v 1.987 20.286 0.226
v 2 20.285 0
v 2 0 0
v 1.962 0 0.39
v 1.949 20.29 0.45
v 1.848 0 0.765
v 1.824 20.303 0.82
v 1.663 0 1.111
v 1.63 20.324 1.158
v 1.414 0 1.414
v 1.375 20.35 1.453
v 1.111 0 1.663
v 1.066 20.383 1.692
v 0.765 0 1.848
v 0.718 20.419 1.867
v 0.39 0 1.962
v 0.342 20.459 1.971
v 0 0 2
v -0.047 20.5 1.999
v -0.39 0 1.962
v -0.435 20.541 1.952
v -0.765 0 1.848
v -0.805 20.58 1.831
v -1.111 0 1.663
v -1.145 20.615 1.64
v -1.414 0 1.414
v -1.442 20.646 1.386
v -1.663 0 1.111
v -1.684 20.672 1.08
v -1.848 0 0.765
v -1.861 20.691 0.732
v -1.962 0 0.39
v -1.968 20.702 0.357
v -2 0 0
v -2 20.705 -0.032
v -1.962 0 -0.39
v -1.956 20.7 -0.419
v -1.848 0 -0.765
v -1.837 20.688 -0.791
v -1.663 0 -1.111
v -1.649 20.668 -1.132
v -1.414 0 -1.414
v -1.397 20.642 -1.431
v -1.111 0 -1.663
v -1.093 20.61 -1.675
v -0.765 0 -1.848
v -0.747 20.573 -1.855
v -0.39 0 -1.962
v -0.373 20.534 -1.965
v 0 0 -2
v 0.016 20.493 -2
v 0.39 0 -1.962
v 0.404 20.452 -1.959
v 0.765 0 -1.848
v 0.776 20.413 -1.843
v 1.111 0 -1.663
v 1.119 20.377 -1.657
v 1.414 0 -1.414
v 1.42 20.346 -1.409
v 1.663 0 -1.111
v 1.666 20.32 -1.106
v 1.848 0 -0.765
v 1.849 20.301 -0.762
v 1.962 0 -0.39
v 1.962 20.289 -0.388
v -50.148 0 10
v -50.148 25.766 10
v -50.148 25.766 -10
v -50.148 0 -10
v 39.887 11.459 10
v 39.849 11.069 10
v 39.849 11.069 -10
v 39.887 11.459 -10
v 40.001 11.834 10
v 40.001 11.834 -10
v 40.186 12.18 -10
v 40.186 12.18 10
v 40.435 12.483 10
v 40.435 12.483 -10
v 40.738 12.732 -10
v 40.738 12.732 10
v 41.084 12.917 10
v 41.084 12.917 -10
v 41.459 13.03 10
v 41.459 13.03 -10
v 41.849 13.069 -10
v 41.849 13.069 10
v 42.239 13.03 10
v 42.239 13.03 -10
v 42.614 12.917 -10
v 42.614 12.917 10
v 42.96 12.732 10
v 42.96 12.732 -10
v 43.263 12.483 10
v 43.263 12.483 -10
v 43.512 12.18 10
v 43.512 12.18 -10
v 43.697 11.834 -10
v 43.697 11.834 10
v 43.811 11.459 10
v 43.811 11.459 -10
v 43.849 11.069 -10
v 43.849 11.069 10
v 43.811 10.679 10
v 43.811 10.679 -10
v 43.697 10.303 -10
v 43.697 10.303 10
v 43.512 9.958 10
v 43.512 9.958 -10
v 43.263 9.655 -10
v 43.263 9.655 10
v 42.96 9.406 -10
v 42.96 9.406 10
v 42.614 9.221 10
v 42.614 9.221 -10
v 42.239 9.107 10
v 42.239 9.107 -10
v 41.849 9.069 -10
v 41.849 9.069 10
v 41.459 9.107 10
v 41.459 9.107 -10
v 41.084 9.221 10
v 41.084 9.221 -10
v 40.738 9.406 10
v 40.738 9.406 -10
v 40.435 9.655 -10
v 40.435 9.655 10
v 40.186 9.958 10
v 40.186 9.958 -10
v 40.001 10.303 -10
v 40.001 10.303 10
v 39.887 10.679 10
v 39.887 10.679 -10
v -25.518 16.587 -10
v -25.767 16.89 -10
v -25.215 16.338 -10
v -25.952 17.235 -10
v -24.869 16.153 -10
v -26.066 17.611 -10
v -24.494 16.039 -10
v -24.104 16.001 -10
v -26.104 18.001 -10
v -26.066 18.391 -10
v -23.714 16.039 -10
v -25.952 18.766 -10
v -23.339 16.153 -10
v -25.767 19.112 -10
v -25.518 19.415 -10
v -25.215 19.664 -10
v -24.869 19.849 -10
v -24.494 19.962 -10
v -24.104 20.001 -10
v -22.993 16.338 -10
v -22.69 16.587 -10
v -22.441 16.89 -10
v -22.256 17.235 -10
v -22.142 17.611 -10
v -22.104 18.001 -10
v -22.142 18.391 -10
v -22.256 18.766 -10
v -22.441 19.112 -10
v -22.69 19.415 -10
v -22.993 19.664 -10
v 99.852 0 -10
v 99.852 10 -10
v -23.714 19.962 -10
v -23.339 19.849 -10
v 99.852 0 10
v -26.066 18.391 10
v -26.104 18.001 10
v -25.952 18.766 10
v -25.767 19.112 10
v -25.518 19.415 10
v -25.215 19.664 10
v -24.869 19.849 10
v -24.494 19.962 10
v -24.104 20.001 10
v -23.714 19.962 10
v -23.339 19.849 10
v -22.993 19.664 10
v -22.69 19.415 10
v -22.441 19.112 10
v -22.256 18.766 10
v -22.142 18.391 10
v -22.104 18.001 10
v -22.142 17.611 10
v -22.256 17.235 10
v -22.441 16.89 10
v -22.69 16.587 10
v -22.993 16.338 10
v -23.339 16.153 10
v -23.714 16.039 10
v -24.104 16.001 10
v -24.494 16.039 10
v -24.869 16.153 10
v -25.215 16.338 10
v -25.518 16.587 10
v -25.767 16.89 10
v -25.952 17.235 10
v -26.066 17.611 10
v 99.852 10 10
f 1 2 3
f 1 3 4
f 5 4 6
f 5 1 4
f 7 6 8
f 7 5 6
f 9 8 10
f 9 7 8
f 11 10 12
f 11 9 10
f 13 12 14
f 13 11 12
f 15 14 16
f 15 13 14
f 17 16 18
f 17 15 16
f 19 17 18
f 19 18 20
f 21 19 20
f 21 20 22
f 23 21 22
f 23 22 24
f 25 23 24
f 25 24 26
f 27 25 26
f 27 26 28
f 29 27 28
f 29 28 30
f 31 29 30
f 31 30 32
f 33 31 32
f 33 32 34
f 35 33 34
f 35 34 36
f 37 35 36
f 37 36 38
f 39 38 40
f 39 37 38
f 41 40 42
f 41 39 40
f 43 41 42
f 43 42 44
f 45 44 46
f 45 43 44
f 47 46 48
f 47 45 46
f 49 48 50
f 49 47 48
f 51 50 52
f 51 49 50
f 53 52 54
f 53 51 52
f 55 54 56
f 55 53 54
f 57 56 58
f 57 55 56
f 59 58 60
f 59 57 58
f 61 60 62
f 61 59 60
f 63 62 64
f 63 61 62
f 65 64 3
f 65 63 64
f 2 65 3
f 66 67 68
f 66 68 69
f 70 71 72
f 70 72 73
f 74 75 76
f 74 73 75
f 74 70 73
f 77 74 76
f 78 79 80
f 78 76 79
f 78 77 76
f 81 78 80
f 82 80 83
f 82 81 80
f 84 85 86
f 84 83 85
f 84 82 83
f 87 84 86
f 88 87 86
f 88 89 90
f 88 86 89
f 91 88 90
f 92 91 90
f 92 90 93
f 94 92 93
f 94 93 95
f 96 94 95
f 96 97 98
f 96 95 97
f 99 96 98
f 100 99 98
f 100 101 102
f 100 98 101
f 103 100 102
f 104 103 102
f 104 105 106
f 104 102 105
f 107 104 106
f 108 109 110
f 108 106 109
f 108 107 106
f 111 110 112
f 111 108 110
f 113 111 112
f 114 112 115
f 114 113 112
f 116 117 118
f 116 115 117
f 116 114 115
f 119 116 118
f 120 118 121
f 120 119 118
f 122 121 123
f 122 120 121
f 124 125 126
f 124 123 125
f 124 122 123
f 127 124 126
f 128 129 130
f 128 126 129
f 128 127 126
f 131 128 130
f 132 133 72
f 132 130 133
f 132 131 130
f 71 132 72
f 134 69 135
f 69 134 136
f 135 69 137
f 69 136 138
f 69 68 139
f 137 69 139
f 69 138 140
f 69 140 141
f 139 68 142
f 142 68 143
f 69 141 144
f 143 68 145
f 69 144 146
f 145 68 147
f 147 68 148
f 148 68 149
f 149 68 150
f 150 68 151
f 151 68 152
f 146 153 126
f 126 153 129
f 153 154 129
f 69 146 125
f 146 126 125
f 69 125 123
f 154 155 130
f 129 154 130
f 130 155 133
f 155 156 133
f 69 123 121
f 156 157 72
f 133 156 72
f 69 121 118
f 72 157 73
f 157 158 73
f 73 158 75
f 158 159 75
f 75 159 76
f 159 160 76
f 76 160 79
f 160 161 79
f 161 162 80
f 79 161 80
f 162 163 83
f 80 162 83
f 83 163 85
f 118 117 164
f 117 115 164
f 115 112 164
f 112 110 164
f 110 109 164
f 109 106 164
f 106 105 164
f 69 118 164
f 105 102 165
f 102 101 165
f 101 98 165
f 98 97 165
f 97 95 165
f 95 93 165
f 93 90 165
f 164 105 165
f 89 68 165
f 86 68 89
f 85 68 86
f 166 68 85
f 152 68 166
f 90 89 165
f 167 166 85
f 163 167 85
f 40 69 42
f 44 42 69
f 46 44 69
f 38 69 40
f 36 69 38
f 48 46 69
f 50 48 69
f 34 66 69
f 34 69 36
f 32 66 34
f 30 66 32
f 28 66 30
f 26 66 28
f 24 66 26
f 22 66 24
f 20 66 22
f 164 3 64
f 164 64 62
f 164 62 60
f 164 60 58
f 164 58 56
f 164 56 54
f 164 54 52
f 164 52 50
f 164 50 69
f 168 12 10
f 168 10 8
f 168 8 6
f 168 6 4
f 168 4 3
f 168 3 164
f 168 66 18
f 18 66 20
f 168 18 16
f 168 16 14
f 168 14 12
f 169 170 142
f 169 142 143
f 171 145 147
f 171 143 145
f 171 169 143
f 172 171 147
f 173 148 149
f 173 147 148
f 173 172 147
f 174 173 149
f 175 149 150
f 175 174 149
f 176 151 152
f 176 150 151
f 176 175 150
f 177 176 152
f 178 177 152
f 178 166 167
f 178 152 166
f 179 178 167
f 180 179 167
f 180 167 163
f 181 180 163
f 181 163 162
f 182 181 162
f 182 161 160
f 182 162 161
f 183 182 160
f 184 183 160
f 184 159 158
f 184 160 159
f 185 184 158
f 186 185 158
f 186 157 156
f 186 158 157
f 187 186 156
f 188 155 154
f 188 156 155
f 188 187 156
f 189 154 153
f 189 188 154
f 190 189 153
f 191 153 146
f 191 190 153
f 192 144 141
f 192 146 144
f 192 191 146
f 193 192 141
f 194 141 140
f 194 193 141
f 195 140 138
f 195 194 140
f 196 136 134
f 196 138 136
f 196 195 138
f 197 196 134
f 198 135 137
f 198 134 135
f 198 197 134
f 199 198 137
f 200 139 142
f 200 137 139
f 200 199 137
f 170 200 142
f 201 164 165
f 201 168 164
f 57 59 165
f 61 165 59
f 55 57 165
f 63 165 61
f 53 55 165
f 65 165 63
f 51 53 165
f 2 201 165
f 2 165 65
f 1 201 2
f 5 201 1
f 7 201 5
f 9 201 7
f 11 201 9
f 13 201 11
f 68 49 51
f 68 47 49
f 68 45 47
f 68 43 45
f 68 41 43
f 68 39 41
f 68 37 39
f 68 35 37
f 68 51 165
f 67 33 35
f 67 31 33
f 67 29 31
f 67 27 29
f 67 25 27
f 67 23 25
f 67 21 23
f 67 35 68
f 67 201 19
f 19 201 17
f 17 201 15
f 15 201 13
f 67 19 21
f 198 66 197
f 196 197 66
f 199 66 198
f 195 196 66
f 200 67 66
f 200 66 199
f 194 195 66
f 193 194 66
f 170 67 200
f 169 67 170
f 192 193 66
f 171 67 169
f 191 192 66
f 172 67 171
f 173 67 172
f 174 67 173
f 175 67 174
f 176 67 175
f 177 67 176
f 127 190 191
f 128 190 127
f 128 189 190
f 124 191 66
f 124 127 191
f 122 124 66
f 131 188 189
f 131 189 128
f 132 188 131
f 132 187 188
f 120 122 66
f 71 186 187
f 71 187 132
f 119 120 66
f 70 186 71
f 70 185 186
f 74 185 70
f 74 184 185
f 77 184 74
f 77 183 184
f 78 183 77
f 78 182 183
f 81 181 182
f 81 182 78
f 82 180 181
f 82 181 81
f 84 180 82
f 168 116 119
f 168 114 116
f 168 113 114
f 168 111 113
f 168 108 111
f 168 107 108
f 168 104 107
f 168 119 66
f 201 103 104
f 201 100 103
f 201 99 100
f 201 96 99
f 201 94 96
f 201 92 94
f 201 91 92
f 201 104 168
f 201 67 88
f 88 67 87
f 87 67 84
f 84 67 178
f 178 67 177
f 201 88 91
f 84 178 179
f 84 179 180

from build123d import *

# Parameters (mm, degrees)
BOSS_EXTRUDE1_DEPTH     = 10
CUT_EXTRUDE1_DEPTH      = 104.60672567
CUT_EXTRUDE1_DEPTH_BACK = 104.60672567
SKETCH2_R               = 2
CUT_EXTRUDE2_DEPTH      = 106.044531529
CUT_EXTRUDE2_DEPTH_BACK = 106.044531529
SKETCH3_R               = 2


with BuildPart() as part:
    # Sketch1 → Boss-Extrude1 (new, symmetric)
    with BuildSketch(Plane.XY):
        Polygon((99.852319163, 10), (-50.147680837, 25.76563529), (-50.147680837, 0), (99.852319163, 0), align=None)
    extrude(amount=BOSS_EXTRUDE1_DEPTH, both=True)

    # Sketch2 → Cut-Extrude1 (cut, two sides: drawn at the far end of the back side and taken through both)
    with BuildSketch(Plane.XZ.offset(-CUT_EXTRUDE1_DEPTH_BACK)):
        Circle(SKETCH2_R)
    extrude(amount=CUT_EXTRUDE1_DEPTH + CUT_EXTRUDE1_DEPTH_BACK, mode=Mode.SUBTRACT)

    # Sketch3 → Cut-Extrude2 (cut, two sides: drawn at the far end of the back side and taken through both)
    with BuildSketch(Plane(origin=(0, 0, -10), x_dir=(-1, 0, 0), z_dir=(0, 0, -1)).offset(-CUT_EXTRUDE2_DEPTH_BACK)):
        with Locations((24.103932874, 18.000785679)):
            Circle(SKETCH3_R)
        with Locations((-41.8489822, 11.068854977)):
            Circle(SKETCH3_R)
    extrude(amount=CUT_EXTRUDE2_DEPTH + CUT_EXTRUDE2_DEPTH_BACK, mode=Mode.SUBTRACT)


solid = part.part
